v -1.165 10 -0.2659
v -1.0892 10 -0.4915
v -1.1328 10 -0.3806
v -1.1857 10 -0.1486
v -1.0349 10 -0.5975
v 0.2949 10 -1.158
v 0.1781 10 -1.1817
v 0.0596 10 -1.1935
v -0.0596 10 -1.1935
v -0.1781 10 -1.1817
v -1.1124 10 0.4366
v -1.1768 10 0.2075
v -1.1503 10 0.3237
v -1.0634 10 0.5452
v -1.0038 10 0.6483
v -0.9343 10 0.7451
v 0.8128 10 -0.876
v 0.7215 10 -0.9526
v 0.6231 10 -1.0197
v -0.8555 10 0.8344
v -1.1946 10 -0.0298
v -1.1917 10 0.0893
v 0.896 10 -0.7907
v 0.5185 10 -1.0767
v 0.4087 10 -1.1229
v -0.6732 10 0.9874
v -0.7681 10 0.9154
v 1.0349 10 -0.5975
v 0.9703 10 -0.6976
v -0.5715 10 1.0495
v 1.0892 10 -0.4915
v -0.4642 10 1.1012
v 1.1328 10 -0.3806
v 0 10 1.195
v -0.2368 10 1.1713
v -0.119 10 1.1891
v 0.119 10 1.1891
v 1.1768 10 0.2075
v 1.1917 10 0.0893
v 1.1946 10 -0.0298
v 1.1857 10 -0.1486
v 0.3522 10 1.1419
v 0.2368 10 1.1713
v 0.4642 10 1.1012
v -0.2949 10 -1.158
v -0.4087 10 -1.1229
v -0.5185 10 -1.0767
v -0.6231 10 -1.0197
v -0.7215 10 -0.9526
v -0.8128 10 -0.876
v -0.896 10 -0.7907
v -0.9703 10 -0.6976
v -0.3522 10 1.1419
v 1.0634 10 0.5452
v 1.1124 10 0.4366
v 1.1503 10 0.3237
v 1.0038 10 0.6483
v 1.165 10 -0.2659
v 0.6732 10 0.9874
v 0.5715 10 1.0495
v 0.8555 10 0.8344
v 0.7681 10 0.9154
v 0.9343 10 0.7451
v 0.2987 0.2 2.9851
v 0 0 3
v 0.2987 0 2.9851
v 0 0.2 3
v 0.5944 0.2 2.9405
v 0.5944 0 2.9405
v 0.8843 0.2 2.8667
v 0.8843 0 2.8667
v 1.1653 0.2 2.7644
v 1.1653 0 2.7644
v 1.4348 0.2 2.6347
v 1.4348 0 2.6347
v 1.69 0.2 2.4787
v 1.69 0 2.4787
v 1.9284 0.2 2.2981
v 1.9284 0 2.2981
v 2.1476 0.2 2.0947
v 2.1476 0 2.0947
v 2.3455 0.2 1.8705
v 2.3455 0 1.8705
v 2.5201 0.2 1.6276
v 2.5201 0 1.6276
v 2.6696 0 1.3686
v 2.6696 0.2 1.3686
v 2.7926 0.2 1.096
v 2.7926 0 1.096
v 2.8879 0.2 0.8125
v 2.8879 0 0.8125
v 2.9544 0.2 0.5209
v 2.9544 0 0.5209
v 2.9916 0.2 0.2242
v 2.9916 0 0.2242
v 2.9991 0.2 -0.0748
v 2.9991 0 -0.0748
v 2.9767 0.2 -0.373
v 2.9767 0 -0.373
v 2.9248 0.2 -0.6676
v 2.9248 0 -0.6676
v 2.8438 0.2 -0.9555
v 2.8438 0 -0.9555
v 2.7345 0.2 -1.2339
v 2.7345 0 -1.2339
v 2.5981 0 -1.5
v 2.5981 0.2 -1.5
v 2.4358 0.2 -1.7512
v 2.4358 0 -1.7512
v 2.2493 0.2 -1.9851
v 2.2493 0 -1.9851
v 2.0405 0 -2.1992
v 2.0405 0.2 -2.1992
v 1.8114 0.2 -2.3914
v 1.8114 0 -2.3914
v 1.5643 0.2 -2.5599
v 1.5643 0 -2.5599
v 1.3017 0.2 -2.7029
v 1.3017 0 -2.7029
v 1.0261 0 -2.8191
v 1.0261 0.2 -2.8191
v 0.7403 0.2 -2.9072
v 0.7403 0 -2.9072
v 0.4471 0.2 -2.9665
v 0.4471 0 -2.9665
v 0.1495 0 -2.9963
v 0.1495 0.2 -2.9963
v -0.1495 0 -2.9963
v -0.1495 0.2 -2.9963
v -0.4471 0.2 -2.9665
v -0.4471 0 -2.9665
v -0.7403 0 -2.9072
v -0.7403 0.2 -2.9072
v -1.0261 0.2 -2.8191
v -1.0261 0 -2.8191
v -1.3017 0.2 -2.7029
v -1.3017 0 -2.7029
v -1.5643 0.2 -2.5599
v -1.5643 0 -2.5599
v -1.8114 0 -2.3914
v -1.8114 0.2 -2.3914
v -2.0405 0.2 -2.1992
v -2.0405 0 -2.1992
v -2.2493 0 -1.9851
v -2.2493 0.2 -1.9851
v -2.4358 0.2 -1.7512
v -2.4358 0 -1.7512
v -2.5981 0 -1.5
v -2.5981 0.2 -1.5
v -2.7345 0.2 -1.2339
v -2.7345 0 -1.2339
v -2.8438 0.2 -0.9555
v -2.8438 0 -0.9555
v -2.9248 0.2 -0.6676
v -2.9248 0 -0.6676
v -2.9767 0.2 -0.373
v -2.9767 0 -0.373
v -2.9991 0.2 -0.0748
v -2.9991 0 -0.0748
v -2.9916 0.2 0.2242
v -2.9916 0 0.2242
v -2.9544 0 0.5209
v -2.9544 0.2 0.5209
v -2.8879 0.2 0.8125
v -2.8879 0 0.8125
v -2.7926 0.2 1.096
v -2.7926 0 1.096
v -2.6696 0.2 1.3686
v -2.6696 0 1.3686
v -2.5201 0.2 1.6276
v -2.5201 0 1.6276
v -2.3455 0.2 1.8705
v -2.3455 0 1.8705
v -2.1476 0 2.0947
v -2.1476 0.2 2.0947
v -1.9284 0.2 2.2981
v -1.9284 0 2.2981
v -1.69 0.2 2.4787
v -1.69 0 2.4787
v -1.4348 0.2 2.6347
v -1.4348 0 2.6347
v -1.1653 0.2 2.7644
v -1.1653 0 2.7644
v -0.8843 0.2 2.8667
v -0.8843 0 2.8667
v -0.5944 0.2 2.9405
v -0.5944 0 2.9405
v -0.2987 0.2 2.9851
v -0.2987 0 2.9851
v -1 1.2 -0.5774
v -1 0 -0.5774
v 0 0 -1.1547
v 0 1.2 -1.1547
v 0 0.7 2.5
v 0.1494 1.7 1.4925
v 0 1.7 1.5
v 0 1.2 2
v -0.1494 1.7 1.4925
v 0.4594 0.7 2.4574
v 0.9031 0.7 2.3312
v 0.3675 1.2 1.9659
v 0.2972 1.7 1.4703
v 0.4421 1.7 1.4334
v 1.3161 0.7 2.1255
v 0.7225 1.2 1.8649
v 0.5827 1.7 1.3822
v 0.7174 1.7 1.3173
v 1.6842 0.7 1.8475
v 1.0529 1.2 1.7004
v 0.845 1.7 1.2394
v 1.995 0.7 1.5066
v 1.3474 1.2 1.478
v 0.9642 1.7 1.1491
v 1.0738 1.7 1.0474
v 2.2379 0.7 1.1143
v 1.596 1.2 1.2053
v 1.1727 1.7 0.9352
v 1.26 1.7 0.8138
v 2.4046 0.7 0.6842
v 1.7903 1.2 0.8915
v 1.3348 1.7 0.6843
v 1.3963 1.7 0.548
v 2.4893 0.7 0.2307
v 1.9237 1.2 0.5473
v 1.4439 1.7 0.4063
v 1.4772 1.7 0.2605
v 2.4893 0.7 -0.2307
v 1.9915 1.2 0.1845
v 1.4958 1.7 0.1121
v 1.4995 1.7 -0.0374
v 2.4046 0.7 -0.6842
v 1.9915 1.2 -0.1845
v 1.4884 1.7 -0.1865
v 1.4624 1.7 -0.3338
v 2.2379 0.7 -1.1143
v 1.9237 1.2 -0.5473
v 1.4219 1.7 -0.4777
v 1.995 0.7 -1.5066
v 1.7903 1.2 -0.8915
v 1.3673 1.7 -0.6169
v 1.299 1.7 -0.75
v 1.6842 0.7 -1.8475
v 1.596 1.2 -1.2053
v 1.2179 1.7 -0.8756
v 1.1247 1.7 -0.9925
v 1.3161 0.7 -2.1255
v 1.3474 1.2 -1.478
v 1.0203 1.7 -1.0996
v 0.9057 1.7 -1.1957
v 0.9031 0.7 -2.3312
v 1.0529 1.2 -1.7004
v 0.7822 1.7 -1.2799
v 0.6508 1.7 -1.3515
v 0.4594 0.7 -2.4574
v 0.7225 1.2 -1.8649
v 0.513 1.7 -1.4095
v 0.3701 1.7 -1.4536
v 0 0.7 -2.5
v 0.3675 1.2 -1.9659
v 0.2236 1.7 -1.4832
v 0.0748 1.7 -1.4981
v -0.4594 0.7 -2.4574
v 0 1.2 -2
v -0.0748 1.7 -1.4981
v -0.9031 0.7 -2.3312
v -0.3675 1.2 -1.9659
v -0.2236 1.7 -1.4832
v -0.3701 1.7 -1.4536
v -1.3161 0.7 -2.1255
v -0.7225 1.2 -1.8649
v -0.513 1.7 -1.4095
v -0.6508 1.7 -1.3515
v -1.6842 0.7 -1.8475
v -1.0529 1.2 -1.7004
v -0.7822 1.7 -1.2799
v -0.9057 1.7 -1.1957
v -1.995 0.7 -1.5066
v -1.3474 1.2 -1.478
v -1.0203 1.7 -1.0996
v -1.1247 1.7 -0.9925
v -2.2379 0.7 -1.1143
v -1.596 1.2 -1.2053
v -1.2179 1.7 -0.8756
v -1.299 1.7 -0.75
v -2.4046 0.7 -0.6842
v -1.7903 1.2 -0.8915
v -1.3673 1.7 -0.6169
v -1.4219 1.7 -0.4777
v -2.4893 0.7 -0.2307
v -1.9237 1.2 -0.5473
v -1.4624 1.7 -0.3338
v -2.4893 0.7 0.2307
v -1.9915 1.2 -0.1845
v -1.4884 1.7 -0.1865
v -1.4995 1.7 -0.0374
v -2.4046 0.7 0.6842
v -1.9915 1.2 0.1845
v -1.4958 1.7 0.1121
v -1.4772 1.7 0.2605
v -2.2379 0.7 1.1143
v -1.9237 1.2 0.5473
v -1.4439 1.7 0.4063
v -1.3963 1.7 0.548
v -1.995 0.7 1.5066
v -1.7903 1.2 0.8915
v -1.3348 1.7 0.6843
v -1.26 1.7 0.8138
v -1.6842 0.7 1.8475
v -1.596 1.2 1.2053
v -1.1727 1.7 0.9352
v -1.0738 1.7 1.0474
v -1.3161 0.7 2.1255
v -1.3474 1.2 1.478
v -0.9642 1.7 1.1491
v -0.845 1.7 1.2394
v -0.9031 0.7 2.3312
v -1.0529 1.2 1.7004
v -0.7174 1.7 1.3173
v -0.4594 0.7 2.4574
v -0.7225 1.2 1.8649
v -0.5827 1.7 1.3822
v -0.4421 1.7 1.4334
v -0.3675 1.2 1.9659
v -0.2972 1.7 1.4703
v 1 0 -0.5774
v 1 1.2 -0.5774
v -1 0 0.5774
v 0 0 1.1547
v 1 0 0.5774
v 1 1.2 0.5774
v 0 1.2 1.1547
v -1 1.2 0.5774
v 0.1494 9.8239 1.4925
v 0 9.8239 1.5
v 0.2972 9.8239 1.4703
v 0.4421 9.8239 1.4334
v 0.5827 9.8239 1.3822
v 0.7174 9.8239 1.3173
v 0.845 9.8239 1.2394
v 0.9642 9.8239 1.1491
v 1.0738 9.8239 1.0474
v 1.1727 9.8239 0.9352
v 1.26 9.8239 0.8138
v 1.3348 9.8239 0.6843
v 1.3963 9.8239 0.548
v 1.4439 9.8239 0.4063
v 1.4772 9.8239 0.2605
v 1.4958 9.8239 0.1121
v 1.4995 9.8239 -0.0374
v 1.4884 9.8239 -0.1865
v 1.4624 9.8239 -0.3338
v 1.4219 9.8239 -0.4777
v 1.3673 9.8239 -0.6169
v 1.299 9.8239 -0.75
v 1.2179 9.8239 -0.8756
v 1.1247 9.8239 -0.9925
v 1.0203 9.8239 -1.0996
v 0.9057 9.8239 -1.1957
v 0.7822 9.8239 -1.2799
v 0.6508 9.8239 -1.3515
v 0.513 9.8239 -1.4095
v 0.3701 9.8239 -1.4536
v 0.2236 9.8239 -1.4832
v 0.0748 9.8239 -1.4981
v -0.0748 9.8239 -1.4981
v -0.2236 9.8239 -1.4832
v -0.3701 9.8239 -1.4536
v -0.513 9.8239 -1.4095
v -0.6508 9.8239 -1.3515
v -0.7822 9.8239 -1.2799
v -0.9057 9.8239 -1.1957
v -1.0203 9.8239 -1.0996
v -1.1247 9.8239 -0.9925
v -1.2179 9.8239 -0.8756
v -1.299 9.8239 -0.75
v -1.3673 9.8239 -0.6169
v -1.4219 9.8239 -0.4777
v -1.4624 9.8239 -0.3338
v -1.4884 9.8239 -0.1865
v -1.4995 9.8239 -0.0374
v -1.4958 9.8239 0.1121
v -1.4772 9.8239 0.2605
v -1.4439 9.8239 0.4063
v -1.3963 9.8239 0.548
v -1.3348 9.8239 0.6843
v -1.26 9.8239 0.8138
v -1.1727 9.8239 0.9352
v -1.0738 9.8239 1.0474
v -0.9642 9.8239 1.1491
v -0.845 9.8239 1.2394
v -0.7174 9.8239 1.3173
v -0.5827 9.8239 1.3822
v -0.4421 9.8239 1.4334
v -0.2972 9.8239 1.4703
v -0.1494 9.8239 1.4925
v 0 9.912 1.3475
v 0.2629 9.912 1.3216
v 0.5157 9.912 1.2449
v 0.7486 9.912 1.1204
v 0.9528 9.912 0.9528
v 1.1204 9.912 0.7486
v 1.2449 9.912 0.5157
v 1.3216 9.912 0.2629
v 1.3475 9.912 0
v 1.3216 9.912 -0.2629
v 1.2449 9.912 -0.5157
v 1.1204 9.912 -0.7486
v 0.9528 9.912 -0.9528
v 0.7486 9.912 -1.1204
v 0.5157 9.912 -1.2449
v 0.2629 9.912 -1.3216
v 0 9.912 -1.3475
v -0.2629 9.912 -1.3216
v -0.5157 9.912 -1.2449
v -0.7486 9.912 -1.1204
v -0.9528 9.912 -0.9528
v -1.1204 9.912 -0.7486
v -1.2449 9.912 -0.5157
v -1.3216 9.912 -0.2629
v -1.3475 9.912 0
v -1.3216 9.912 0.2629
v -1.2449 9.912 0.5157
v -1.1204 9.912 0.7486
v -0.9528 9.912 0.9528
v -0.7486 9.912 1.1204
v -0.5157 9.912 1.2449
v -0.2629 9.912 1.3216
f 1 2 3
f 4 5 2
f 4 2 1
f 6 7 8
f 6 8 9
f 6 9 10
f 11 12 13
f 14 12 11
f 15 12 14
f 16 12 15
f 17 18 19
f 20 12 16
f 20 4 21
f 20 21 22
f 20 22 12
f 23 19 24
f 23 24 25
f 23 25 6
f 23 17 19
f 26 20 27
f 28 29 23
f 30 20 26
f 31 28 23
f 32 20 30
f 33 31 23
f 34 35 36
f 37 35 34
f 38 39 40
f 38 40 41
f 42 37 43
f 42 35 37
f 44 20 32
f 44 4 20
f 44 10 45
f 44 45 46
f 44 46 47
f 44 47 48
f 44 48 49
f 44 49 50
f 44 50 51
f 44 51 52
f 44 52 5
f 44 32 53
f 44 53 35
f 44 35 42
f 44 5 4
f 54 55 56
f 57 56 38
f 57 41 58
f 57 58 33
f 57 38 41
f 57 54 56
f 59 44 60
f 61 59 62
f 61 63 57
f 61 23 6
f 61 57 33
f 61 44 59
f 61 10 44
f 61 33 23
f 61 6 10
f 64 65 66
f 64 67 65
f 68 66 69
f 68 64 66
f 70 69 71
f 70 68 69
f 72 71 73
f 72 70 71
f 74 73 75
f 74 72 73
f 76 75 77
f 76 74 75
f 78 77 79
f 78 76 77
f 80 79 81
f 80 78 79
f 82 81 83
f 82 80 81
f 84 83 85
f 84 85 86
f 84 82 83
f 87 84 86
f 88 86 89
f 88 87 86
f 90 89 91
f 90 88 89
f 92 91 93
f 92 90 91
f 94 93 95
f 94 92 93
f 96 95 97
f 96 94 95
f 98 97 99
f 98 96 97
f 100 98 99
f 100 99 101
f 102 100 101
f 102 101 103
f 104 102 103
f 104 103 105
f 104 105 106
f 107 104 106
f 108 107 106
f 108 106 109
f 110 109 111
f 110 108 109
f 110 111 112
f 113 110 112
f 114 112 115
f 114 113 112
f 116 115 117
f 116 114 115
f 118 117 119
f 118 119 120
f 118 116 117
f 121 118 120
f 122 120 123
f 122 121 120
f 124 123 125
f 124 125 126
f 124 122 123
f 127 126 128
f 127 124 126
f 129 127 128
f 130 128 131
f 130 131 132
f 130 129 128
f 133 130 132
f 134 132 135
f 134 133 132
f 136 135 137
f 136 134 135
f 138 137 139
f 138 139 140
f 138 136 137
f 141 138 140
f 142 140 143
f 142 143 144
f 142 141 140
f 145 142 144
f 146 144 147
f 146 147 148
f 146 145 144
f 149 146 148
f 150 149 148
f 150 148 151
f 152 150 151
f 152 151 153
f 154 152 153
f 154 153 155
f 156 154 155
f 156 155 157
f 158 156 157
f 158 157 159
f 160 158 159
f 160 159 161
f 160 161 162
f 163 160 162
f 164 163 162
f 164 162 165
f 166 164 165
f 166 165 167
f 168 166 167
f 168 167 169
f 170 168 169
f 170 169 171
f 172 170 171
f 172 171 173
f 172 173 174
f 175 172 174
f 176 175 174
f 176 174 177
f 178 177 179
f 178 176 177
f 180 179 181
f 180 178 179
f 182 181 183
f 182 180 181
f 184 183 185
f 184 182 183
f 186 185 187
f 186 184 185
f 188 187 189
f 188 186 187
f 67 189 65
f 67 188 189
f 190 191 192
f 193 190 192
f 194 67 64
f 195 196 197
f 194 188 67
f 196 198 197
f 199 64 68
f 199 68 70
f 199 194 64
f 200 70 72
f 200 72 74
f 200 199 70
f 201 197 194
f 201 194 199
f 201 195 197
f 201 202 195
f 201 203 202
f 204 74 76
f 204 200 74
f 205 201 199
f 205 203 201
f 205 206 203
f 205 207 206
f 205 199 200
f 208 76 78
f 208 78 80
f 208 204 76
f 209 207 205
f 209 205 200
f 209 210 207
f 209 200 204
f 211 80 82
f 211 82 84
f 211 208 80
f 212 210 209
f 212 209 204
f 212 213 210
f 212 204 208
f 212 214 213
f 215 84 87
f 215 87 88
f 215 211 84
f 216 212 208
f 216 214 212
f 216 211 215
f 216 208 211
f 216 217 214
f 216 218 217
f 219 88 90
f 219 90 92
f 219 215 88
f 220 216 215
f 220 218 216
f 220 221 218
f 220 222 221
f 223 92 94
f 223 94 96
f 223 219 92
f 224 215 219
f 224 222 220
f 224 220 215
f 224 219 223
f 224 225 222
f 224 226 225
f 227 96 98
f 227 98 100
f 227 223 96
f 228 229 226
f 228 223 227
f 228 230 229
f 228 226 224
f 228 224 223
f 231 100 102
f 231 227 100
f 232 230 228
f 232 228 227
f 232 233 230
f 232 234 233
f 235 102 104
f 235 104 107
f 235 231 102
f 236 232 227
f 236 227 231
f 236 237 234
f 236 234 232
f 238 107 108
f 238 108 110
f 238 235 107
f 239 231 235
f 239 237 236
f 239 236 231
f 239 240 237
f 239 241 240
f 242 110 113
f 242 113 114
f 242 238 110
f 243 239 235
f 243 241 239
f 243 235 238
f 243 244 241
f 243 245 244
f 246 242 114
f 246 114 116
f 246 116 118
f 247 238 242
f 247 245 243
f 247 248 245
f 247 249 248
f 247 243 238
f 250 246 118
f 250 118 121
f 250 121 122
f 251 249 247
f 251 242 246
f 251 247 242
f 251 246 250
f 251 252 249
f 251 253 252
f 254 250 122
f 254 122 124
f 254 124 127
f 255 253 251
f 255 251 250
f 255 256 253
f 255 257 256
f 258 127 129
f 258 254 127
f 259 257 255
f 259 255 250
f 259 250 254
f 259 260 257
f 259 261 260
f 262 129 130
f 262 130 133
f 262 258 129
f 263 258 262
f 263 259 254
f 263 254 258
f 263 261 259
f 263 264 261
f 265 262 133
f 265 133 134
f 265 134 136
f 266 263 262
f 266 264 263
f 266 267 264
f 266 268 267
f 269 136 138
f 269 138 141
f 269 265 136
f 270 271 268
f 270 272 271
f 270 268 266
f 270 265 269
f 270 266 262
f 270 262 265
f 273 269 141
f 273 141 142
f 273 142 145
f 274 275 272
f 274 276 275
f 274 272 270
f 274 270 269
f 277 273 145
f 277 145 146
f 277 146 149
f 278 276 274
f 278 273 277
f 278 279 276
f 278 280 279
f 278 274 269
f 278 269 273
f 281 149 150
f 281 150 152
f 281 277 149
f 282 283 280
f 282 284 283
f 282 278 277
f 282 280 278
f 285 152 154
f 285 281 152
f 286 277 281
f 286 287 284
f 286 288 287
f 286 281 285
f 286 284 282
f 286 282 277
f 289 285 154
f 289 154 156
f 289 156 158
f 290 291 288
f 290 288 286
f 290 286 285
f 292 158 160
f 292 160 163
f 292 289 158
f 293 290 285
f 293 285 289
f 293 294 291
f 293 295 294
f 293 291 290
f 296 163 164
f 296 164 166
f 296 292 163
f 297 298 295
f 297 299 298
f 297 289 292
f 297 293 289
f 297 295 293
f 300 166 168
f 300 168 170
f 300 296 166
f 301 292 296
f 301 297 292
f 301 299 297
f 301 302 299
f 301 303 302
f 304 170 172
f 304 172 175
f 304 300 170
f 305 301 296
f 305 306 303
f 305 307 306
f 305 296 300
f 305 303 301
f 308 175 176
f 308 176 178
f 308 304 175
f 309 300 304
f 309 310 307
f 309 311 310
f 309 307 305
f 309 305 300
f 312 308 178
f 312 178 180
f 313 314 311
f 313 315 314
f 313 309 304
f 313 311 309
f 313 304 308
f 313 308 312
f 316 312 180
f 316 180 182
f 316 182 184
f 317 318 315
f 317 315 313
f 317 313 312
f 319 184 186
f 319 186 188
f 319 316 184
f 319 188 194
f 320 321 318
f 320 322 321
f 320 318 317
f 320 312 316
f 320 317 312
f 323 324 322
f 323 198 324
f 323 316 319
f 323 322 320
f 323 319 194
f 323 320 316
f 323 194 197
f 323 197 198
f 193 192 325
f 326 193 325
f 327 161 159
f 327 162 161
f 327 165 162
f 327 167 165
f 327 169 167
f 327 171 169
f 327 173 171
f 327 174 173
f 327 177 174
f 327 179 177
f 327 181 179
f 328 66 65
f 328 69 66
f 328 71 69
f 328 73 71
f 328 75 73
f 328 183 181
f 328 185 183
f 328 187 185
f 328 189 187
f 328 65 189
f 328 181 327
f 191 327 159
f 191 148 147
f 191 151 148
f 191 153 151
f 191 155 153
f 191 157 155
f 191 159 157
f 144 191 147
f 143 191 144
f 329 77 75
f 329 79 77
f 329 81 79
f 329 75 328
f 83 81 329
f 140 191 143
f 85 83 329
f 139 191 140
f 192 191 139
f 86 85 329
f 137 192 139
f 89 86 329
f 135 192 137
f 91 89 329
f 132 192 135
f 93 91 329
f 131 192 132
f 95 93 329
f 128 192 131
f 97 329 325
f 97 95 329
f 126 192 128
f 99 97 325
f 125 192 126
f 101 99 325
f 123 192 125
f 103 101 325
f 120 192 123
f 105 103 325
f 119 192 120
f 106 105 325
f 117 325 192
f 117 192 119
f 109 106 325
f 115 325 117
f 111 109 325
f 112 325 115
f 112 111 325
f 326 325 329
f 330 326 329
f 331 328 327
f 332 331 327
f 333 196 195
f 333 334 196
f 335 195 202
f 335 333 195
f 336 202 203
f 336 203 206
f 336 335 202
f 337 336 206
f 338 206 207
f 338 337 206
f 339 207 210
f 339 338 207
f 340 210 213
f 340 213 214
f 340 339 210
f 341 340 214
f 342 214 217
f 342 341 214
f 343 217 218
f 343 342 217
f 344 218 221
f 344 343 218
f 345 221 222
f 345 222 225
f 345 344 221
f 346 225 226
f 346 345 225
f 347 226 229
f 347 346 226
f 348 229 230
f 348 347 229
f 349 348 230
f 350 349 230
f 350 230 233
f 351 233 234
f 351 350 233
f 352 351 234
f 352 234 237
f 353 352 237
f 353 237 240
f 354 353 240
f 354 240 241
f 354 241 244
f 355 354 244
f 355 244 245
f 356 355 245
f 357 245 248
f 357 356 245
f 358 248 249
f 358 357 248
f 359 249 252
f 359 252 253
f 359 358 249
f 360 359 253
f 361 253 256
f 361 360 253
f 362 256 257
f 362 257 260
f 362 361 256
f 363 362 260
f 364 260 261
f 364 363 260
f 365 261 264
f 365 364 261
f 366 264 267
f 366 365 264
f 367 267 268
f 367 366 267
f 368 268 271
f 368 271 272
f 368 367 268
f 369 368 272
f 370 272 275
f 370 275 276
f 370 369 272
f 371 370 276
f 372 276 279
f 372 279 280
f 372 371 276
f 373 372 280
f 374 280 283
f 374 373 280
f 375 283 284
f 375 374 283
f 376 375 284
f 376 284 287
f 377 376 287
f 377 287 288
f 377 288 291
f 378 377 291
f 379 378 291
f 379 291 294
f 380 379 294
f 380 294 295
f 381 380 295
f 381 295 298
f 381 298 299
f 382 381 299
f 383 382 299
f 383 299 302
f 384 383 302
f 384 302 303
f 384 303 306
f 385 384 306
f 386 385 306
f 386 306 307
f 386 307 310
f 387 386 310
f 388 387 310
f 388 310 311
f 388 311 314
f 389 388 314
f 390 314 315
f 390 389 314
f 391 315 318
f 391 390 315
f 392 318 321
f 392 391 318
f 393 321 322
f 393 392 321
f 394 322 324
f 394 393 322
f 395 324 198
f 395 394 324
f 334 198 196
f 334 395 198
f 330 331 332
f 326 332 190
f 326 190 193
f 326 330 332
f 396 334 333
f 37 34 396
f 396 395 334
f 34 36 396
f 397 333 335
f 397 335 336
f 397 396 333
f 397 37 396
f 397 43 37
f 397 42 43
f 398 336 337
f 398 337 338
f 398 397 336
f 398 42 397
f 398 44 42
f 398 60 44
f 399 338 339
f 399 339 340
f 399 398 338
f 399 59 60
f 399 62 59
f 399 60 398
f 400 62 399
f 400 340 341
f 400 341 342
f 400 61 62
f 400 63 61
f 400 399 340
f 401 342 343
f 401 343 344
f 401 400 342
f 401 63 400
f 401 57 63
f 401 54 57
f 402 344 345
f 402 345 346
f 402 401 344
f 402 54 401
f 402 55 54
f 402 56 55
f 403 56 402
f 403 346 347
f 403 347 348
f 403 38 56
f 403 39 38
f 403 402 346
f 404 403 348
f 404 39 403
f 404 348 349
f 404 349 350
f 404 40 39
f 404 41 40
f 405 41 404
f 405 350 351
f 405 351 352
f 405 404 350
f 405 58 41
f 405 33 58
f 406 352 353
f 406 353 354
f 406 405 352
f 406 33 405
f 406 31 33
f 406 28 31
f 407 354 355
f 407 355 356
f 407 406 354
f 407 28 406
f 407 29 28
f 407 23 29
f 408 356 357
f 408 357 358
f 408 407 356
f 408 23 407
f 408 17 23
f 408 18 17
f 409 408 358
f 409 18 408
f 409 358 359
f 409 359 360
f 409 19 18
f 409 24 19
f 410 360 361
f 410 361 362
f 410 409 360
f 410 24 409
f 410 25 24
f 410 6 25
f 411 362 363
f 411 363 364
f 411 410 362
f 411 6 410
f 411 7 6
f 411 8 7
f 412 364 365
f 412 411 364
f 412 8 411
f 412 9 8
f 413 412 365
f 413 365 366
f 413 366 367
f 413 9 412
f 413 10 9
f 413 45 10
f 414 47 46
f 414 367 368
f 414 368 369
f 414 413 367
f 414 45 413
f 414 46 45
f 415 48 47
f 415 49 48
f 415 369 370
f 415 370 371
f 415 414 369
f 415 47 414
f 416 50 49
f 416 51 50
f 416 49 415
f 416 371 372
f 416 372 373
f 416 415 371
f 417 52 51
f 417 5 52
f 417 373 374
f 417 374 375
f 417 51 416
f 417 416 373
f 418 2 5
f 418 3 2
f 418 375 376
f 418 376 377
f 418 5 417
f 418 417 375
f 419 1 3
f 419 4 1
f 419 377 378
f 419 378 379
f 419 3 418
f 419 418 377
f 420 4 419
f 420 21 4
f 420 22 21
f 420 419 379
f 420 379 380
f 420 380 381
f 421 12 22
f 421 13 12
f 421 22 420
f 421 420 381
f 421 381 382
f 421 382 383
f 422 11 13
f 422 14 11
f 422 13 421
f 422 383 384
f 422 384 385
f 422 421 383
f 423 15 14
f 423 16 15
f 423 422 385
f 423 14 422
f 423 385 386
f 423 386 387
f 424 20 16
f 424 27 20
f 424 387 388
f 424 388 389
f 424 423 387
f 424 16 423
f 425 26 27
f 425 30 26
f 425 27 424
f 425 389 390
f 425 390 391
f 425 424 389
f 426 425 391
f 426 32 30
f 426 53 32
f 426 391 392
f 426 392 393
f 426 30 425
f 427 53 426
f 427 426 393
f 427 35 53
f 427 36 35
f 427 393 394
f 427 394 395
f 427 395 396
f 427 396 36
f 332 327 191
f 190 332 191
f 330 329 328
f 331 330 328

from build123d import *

# Parameters (mm, degrees)
POCKET_DEPTH = 1.2


with BuildPart() as part:
    # Sketch → Revolution (revolve)
    with BuildSketch(Plane.YZ):
        Polygon((0, 0), (0, 3), (0.2, 3), (1.7, 1.5), (9.823908, 1.5), (10, 1.195), (10, 0), align=None)
    revolve(axis=Axis((0, 0, 0), (0, 1, 0)))

    # Sketch001 → Pocket (cut)
    with BuildSketch(Plane(origin=(0, 0, 0), x_dir=(0, 0, -1), z_dir=(0, -1, 0))):
        Polygon((0.57735, 1), (-0.57735, 1), (-1.154701, 0), (-0.57735, -1), (0.57735, -1), (1.154701, 0), align=None)
    extrude(amount=-POCKET_DEPTH, mode=Mode.SUBTRACT)


solid = part.part
